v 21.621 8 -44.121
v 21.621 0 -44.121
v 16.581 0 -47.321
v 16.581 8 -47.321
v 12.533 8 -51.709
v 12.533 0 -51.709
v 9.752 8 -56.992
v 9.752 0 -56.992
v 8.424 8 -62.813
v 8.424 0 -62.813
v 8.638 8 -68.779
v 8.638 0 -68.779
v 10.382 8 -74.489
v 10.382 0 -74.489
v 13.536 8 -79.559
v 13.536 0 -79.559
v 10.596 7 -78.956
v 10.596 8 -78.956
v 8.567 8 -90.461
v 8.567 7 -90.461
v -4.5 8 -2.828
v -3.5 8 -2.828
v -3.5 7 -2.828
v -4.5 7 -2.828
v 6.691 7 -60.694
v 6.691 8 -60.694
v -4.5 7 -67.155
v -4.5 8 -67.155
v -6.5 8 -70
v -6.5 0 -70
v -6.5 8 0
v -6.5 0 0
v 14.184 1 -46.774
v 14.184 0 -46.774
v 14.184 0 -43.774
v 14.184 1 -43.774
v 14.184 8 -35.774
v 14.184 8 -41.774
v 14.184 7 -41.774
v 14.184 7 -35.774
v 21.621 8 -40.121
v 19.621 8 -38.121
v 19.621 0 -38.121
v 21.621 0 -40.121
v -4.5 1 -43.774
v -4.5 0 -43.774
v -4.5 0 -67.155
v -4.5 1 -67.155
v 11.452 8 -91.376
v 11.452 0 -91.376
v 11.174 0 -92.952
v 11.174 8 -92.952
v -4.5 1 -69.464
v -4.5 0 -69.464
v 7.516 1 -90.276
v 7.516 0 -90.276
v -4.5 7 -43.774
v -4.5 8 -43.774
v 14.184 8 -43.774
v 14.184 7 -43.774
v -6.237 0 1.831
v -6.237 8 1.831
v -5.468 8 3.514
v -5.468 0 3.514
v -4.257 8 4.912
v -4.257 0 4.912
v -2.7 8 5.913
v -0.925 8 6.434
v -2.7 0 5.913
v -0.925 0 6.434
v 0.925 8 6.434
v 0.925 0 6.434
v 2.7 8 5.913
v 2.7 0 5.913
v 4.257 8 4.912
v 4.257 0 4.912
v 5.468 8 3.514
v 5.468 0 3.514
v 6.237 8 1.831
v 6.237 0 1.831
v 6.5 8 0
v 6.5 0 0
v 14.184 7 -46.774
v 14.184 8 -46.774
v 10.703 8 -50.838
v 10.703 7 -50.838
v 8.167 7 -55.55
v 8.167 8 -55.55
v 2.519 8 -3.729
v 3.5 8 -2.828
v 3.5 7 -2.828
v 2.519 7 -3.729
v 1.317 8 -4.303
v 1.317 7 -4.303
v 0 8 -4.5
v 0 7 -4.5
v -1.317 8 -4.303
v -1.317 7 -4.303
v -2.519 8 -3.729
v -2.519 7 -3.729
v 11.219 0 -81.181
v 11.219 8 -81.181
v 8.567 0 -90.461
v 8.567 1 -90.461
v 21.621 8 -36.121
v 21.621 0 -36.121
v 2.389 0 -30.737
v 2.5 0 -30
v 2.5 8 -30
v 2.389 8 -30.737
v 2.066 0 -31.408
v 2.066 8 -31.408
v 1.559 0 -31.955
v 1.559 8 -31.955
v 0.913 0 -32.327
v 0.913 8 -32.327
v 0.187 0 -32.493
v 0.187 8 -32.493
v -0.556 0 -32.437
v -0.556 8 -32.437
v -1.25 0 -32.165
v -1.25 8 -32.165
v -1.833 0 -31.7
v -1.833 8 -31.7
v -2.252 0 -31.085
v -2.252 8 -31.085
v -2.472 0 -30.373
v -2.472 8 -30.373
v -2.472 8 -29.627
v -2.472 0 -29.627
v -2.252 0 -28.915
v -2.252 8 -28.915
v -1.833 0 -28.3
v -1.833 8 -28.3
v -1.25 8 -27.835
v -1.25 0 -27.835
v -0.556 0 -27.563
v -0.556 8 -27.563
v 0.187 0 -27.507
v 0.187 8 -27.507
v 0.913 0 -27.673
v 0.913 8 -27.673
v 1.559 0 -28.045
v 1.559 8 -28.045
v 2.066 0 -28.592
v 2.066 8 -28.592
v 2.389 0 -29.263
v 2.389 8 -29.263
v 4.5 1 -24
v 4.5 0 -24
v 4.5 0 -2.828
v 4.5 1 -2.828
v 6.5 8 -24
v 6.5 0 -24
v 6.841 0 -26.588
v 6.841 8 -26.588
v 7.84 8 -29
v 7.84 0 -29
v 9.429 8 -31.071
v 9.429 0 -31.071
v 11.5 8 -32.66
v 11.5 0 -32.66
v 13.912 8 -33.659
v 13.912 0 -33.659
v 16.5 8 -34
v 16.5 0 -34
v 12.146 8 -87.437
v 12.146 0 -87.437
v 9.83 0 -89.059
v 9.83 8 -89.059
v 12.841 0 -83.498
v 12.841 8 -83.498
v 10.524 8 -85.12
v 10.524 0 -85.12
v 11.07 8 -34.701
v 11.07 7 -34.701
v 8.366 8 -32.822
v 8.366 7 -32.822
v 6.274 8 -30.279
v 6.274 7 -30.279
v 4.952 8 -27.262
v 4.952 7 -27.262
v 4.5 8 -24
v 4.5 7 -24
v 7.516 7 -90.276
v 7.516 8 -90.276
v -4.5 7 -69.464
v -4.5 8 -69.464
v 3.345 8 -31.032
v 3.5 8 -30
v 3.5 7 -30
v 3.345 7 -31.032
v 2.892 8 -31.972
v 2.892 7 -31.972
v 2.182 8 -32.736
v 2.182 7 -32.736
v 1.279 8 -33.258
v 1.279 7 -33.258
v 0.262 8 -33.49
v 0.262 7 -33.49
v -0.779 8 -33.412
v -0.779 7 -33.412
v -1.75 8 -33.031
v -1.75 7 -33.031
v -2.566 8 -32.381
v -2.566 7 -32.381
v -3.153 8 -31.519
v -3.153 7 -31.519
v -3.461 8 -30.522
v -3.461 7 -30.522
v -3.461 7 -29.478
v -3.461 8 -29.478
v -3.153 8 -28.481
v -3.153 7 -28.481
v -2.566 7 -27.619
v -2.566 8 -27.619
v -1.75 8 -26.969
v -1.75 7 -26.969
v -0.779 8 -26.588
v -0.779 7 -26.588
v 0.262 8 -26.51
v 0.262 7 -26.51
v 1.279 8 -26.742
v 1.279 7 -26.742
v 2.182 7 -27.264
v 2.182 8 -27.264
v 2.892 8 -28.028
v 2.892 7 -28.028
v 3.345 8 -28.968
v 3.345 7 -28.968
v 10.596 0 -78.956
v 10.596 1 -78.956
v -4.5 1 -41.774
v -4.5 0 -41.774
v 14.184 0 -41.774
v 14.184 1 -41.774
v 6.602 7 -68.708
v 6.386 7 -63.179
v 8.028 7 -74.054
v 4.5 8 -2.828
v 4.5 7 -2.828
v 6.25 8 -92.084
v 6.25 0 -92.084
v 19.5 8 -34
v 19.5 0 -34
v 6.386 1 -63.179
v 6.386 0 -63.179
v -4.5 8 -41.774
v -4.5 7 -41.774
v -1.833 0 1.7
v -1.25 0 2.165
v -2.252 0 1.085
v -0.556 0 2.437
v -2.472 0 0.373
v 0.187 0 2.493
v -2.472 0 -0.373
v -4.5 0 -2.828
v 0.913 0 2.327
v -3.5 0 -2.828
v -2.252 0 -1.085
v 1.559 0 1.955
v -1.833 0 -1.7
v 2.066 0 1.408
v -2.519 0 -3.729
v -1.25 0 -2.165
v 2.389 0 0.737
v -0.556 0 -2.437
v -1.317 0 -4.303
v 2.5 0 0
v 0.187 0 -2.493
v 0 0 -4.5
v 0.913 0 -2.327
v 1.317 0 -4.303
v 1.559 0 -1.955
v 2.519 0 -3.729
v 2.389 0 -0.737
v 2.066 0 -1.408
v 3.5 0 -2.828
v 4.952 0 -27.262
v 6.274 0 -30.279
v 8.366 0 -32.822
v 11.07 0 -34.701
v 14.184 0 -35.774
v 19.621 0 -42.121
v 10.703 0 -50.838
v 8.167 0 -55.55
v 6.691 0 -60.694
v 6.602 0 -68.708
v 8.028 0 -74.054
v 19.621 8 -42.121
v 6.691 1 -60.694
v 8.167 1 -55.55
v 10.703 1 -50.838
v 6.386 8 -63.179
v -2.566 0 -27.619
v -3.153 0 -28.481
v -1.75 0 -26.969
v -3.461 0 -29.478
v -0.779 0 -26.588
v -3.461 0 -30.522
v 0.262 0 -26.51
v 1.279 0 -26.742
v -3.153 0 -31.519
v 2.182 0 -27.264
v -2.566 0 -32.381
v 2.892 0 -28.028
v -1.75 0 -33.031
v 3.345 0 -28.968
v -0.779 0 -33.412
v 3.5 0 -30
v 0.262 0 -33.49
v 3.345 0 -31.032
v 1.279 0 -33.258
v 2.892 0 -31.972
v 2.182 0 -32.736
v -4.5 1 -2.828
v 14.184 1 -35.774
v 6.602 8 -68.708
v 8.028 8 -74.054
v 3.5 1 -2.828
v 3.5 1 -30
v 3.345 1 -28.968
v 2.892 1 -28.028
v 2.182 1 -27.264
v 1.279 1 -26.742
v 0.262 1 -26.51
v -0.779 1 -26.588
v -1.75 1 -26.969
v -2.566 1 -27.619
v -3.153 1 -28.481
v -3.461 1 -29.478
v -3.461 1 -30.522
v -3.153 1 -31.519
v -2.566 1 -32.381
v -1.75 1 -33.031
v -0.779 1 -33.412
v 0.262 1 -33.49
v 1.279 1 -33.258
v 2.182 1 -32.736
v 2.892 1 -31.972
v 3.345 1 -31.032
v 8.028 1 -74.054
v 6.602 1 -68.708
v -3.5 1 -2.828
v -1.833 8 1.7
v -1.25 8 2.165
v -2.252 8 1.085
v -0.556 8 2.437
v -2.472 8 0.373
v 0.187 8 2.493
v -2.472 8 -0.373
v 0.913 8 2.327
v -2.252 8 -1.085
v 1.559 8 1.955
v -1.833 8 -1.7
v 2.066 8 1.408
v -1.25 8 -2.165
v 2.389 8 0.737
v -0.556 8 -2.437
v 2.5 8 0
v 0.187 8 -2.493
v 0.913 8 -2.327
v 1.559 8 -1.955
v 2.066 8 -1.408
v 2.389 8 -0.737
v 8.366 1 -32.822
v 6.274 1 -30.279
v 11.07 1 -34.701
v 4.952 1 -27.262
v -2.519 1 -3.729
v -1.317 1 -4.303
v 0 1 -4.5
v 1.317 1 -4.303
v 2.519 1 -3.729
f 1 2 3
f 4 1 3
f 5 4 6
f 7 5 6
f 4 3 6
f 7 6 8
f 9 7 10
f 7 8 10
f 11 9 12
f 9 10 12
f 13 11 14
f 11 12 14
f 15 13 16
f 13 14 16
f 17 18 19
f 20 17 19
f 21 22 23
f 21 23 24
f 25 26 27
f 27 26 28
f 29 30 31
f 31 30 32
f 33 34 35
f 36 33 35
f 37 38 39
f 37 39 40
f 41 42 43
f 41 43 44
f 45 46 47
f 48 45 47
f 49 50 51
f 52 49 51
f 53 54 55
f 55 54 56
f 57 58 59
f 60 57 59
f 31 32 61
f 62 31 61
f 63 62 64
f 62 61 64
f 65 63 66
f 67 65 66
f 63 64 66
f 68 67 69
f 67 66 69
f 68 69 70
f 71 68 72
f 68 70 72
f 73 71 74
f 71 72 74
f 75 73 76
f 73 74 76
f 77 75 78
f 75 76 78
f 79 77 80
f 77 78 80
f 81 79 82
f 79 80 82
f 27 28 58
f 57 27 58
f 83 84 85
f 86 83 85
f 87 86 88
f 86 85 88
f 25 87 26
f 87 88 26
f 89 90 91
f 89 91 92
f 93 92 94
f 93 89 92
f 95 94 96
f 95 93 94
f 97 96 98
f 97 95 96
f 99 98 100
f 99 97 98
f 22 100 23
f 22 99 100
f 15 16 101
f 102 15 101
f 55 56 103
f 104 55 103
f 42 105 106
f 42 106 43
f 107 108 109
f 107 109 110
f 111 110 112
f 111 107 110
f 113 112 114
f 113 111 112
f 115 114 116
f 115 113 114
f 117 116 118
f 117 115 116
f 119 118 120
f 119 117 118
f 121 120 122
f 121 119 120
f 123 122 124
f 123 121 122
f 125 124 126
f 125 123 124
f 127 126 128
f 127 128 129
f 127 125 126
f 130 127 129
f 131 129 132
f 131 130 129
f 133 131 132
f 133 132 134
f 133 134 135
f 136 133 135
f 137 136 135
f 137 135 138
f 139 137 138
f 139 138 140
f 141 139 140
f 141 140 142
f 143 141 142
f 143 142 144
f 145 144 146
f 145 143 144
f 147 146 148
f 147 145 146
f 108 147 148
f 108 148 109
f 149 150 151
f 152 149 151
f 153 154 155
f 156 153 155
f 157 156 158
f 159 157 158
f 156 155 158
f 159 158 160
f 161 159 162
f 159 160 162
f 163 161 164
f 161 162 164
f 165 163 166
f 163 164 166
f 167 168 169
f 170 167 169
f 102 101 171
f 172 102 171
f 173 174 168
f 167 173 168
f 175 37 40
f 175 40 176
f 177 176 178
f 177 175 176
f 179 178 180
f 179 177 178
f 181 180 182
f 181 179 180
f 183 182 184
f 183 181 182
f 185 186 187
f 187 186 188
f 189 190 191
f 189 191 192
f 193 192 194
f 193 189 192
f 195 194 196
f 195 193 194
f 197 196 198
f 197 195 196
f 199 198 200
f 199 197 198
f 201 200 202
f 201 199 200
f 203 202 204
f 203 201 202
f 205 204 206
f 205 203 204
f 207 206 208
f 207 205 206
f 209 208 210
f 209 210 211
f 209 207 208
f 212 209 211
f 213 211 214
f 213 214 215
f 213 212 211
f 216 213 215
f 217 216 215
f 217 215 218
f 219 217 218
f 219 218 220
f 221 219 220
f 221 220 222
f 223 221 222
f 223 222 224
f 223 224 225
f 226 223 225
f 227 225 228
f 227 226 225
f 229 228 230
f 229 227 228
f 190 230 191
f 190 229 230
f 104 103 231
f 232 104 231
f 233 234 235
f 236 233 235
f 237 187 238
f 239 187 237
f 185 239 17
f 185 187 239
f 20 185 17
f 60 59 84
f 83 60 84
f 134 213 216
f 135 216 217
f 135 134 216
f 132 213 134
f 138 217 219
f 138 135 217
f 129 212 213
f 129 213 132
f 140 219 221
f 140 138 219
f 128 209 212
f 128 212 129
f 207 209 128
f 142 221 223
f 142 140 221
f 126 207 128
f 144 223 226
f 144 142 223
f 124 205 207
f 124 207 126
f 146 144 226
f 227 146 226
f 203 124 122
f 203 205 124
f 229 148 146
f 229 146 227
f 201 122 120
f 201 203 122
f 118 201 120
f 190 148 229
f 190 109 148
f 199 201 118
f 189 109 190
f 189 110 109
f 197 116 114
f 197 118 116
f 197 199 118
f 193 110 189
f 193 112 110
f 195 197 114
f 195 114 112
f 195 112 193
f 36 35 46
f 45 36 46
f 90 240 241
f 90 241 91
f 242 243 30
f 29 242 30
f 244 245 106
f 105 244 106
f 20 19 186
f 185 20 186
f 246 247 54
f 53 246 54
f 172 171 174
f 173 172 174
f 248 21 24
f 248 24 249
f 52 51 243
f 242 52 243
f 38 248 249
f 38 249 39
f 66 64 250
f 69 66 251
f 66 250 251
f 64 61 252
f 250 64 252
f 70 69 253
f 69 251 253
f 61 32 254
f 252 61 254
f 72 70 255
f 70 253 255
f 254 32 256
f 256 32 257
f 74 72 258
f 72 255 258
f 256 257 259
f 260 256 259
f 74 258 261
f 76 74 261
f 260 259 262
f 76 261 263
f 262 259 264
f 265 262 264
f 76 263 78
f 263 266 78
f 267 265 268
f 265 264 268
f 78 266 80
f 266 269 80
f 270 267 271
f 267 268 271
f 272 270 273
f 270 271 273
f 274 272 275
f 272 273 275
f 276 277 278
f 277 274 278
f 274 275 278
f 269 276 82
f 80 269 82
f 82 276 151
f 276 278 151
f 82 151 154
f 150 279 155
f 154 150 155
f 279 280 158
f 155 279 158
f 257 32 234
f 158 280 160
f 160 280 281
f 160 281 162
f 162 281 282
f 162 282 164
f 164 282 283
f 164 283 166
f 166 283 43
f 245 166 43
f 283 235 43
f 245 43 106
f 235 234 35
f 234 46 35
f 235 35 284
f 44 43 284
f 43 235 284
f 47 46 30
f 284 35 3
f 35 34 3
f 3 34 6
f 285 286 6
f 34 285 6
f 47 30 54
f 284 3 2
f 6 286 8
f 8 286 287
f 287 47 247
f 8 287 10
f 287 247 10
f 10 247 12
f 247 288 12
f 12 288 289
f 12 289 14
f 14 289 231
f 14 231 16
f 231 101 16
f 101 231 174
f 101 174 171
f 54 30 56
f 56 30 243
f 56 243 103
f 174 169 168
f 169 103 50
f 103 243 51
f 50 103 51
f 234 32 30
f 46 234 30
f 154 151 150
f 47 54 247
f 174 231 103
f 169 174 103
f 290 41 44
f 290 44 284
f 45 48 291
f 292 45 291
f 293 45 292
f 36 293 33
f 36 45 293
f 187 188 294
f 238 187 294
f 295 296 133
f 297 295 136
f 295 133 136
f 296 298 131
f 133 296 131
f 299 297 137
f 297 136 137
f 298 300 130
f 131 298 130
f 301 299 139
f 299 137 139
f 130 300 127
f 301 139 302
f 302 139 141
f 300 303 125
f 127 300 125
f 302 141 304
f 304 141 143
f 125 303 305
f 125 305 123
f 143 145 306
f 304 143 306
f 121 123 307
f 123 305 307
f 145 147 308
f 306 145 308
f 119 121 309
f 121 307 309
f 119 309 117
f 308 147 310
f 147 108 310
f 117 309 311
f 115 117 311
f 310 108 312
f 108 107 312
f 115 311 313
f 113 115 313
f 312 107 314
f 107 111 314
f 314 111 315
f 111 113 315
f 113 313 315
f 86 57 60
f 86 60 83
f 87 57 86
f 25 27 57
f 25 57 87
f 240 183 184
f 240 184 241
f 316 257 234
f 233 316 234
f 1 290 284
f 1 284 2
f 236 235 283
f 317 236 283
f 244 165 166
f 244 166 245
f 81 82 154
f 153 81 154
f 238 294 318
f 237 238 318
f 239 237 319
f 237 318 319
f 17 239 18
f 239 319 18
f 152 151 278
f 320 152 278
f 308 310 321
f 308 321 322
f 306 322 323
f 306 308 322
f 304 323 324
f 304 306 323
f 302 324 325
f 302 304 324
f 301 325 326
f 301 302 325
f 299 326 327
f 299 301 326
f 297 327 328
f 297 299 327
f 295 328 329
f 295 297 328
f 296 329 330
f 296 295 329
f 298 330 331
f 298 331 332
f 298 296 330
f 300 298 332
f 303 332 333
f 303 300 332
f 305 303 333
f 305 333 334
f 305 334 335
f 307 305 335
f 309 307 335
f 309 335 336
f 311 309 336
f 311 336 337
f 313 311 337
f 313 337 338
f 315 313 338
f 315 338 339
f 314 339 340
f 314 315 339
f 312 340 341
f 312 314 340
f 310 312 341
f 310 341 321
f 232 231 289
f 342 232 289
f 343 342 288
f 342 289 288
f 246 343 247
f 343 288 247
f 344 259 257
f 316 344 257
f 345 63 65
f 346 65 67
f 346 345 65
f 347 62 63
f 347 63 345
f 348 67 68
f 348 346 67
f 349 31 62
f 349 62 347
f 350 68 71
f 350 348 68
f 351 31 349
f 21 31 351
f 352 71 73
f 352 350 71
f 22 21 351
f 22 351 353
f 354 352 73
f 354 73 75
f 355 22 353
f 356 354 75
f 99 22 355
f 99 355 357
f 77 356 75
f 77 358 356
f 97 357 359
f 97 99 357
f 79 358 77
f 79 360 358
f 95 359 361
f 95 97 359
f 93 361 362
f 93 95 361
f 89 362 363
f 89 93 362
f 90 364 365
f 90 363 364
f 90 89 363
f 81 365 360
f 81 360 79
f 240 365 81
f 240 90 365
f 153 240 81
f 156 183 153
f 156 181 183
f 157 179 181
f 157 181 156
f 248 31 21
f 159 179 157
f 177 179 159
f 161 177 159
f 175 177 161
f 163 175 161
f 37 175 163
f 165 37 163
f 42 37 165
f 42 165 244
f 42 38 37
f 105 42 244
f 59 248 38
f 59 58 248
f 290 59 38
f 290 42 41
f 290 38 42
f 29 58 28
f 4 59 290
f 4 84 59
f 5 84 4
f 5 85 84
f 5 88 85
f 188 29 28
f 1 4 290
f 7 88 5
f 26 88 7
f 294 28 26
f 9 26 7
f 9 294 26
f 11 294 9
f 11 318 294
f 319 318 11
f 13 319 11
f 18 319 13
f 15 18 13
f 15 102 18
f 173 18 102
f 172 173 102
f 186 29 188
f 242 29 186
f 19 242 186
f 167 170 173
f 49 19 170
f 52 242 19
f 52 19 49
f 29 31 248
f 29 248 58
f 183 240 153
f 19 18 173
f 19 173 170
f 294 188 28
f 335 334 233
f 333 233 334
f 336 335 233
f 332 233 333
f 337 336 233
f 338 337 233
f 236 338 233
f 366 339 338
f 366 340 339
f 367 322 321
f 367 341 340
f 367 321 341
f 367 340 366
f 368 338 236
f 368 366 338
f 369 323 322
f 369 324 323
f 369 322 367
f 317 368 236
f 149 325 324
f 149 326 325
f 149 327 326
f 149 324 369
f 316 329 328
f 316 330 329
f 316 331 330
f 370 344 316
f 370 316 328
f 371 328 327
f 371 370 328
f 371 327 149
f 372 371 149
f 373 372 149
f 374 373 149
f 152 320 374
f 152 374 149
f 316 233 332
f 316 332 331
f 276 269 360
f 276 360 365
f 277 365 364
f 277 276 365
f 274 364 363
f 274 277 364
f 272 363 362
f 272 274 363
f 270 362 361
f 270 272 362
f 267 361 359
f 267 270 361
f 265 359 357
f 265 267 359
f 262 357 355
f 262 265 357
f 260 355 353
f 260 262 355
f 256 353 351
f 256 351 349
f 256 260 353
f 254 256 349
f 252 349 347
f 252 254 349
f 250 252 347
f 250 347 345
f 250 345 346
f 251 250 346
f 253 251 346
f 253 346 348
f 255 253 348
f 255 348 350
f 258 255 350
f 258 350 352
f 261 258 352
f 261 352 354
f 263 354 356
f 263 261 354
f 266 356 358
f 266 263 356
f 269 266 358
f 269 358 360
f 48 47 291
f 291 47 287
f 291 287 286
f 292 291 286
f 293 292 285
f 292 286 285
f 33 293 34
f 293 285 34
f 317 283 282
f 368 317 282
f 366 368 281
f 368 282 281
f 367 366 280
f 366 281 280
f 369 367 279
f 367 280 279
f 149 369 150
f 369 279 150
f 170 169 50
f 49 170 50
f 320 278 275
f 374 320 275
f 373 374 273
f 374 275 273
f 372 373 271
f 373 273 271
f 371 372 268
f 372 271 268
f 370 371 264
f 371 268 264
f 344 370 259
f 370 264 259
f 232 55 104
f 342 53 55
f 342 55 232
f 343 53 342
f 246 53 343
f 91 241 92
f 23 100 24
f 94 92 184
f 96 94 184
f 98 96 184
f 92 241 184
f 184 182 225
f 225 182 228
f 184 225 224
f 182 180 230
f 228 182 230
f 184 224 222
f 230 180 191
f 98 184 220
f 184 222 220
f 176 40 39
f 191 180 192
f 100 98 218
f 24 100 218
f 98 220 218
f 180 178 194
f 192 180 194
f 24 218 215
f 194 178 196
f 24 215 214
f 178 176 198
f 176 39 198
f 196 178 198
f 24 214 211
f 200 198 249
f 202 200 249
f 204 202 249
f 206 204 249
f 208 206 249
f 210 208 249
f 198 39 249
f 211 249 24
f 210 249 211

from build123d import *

# Parameters (mm, degrees)
CROQUIS2_R              = 2.5
SALIENTE_EXTRUIR1_DEPTH = 8
CROQUIS3_R              = 3.5
CORTAR_EXTRUIR1_DEPTH   = 1
CROQUIS4_R              = 3.5
CORTAR_EXTRUIR2_DEPTH   = 1


with BuildPart() as part:
    # Croquis2 → Saliente-Extruir1 (new body)
    with BuildSketch(Plane(origin=(0, 0, 0), x_dir=(1, 0, 0), z_dir=(0, 1, 0))):
        with BuildLine():
            Line((-6.5, 70), (-6.5, 0))
            ThreePointArc((-6.5, 0), (0, -6.5), (6.5, 0))
            Line((6.5, 0), (6.5, 24))
            ThreePointArc((6.5, 24), (9.428932188, 31.071067812), (16.5, 34))
            Line((16.5, 34), (19.5, 34))
            Line((19.5, 34), (21.621320344, 36.121320344))
            Line((21.621320344, 36.121320344), (19.621320344, 38.121320344))
            Line((19.621320344, 38.121320344), (21.621320344, 40.121320344))
            Line((21.621320344, 40.121320344), (19.621320344, 42.121320344))
            Line((19.621320344, 42.121320344), (21.621320344, 44.121320344))
            ThreePointArc((21.621320344, 44.121320344), (8.897927721, 59.859277281), (13.535653981, 79.558503244))
            Line((13.535653981, 79.558503244), (11.21874212, 81.180822395))
            Line((11.21874212, 81.180822395), (12.841061271, 83.497734256))
            Line((12.841061271, 83.497734256), (10.524149409, 85.120053407))
            Line((10.524149409, 85.120053407), (12.14646856, 87.436965268))
            Line((12.14646856, 87.436965268), (9.829556699, 89.059284419))
            Line((9.829556699, 89.059284419), (11.451875849, 91.37619628))
            Line((11.451875849, 91.37619628), (11.174038765, 92.951888685))
            Line((11.174038765, 92.951888685), (6.25, 92.083647797))
            Line((6.25, 92.083647797), (-6.5, 70))
        make_face()
        Circle(CROQUIS2_R, mode=Mode.SUBTRACT)
        with Locations((0, 30)):
            Circle(CROQUIS2_R, mode=Mode.SUBTRACT)
    extrude(amount=SALIENTE_EXTRUIR1_DEPTH)

    # Croquis3 → Cortar-Extruir1 (cut)
    with BuildSketch(Plane(origin=(0, 8, 0), x_dir=(1, 0, 0), z_dir=(0, 1, 0))):
        with BuildLine():
            Line((7.515743149, 90.275979241), (-4.5, 69.464101615))
            Line((-4.5, 69.464101615), (6.386283079, 63.178903149))
            ThreePointArc((6.386283079, 63.178903149), (7.166644063, 71.420557609), (10.59569924, 78.955503667))
            Line((10.59569924, 78.955503667), (8.566911861, 90.461328646))
            Line((8.566911861, 90.461328646), (7.515743149, 90.275979241))
        make_face()
        with BuildLine():
            Line((-4.5, 67.154700538), (-4.5, 43.774315056))
            Line((-4.5, 43.774315056), (14.183644035, 43.774315056))
            Line((14.183644035, 43.774315056), (14.183644035, 46.774315056))
            ThreePointArc((14.183644035, 46.774315056), (9.308263877, 53.126130169), (6.691099089, 60.693516467))
            Line((6.691099089, 60.693516467), (-4.5, 67.154700538))
        make_face()
        with BuildLine():
            Line((-4.5, 2.828427125), (-4.5, 41.774315056))
            Line((-4.5, 41.774315056), (14.183644035, 41.774315056))
            Line((14.183644035, 41.774315056), (14.183644035, 35.774315056))
            ThreePointArc((14.183644035, 35.774315056), (7.231875282, 31.622457885), (4.5, 24))
            Line((4.5, 24), (4.5, 2.828427125))
            Line((4.5, 2.828427125), (3.5, 2.828427125))
            ThreePointArc((3.5, 2.828427125), (0, 4.5), (-3.5, 2.828427125))
            Line((-3.5, 2.828427125), (-4.5, 2.828427125))
        make_face()
        with Locations((0, 30)):
            Circle(CROQUIS3_R, mode=Mode.SUBTRACT)
    extrude(amount=-CORTAR_EXTRUIR1_DEPTH, mode=Mode.SUBTRACT)

    # Croquis4 → Cortar-Extruir2 (cut)
    with BuildSketch(Plane.XZ):
        with BuildLine():
            Line((4.5, -24), (4.5, -2.828427125))
            Line((4.5, -2.828427125), (3.5, -2.828427125))
            ThreePointArc((3.5, -2.828427125), (0, -4.5), (-3.5, -2.828427125))
            Line((-3.5, -2.828427125), (-4.5, -2.828427125))
            Line((-4.5, -2.828427125), (-4.5, -41.774315056))
            Line((-4.5, -41.774315056), (14.183644035, -41.774315056))
            Line((14.183644035, -41.774315056), (14.183644035, -35.774315056))
            ThreePointArc((14.183644035, -35.774315056), (7.231875282, -31.622457885), (4.5, -24))
        make_face()
        with Locations((0, -30)):
            Circle(CROQUIS4_R, mode=Mode.SUBTRACT)
        with BuildLine():
            Line((6.386283079, -63.178903149), (-4.5, -69.464101615))
            Line((-4.5, -69.464101615), (7.515743149, -90.275979241))
            Line((7.515743149, -90.275979241), (8.566911861, -90.461328646))
            Line((8.566911861, -90.461328646), (10.59569924, -78.955503667))
            ThreePointArc((10.59569924, -78.955503667), (7.166644063, -71.420557609), (6.386283079, -63.178903149))
        make_face()
        with BuildLine():
            Line((-4.5, -67.154700538), (6.691099089, -60.693516467))
            ThreePointArc((6.691099089, -60.693516467), (9.308263877, -53.126130169), (14.183644035, -46.774315056))
            Line((14.183644035, -46.774315056), (14.183644035, -43.774315056))
            Line((14.183644035, -43.774315056), (-4.5, -43.774315056))
            Line((-4.5, -43.774315056), (-4.5, -67.154700538))
        make_face()
    extrude(amount=-CORTAR_EXTRUIR2_DEPTH, mode=Mode.SUBTRACT)


solid = part.part
